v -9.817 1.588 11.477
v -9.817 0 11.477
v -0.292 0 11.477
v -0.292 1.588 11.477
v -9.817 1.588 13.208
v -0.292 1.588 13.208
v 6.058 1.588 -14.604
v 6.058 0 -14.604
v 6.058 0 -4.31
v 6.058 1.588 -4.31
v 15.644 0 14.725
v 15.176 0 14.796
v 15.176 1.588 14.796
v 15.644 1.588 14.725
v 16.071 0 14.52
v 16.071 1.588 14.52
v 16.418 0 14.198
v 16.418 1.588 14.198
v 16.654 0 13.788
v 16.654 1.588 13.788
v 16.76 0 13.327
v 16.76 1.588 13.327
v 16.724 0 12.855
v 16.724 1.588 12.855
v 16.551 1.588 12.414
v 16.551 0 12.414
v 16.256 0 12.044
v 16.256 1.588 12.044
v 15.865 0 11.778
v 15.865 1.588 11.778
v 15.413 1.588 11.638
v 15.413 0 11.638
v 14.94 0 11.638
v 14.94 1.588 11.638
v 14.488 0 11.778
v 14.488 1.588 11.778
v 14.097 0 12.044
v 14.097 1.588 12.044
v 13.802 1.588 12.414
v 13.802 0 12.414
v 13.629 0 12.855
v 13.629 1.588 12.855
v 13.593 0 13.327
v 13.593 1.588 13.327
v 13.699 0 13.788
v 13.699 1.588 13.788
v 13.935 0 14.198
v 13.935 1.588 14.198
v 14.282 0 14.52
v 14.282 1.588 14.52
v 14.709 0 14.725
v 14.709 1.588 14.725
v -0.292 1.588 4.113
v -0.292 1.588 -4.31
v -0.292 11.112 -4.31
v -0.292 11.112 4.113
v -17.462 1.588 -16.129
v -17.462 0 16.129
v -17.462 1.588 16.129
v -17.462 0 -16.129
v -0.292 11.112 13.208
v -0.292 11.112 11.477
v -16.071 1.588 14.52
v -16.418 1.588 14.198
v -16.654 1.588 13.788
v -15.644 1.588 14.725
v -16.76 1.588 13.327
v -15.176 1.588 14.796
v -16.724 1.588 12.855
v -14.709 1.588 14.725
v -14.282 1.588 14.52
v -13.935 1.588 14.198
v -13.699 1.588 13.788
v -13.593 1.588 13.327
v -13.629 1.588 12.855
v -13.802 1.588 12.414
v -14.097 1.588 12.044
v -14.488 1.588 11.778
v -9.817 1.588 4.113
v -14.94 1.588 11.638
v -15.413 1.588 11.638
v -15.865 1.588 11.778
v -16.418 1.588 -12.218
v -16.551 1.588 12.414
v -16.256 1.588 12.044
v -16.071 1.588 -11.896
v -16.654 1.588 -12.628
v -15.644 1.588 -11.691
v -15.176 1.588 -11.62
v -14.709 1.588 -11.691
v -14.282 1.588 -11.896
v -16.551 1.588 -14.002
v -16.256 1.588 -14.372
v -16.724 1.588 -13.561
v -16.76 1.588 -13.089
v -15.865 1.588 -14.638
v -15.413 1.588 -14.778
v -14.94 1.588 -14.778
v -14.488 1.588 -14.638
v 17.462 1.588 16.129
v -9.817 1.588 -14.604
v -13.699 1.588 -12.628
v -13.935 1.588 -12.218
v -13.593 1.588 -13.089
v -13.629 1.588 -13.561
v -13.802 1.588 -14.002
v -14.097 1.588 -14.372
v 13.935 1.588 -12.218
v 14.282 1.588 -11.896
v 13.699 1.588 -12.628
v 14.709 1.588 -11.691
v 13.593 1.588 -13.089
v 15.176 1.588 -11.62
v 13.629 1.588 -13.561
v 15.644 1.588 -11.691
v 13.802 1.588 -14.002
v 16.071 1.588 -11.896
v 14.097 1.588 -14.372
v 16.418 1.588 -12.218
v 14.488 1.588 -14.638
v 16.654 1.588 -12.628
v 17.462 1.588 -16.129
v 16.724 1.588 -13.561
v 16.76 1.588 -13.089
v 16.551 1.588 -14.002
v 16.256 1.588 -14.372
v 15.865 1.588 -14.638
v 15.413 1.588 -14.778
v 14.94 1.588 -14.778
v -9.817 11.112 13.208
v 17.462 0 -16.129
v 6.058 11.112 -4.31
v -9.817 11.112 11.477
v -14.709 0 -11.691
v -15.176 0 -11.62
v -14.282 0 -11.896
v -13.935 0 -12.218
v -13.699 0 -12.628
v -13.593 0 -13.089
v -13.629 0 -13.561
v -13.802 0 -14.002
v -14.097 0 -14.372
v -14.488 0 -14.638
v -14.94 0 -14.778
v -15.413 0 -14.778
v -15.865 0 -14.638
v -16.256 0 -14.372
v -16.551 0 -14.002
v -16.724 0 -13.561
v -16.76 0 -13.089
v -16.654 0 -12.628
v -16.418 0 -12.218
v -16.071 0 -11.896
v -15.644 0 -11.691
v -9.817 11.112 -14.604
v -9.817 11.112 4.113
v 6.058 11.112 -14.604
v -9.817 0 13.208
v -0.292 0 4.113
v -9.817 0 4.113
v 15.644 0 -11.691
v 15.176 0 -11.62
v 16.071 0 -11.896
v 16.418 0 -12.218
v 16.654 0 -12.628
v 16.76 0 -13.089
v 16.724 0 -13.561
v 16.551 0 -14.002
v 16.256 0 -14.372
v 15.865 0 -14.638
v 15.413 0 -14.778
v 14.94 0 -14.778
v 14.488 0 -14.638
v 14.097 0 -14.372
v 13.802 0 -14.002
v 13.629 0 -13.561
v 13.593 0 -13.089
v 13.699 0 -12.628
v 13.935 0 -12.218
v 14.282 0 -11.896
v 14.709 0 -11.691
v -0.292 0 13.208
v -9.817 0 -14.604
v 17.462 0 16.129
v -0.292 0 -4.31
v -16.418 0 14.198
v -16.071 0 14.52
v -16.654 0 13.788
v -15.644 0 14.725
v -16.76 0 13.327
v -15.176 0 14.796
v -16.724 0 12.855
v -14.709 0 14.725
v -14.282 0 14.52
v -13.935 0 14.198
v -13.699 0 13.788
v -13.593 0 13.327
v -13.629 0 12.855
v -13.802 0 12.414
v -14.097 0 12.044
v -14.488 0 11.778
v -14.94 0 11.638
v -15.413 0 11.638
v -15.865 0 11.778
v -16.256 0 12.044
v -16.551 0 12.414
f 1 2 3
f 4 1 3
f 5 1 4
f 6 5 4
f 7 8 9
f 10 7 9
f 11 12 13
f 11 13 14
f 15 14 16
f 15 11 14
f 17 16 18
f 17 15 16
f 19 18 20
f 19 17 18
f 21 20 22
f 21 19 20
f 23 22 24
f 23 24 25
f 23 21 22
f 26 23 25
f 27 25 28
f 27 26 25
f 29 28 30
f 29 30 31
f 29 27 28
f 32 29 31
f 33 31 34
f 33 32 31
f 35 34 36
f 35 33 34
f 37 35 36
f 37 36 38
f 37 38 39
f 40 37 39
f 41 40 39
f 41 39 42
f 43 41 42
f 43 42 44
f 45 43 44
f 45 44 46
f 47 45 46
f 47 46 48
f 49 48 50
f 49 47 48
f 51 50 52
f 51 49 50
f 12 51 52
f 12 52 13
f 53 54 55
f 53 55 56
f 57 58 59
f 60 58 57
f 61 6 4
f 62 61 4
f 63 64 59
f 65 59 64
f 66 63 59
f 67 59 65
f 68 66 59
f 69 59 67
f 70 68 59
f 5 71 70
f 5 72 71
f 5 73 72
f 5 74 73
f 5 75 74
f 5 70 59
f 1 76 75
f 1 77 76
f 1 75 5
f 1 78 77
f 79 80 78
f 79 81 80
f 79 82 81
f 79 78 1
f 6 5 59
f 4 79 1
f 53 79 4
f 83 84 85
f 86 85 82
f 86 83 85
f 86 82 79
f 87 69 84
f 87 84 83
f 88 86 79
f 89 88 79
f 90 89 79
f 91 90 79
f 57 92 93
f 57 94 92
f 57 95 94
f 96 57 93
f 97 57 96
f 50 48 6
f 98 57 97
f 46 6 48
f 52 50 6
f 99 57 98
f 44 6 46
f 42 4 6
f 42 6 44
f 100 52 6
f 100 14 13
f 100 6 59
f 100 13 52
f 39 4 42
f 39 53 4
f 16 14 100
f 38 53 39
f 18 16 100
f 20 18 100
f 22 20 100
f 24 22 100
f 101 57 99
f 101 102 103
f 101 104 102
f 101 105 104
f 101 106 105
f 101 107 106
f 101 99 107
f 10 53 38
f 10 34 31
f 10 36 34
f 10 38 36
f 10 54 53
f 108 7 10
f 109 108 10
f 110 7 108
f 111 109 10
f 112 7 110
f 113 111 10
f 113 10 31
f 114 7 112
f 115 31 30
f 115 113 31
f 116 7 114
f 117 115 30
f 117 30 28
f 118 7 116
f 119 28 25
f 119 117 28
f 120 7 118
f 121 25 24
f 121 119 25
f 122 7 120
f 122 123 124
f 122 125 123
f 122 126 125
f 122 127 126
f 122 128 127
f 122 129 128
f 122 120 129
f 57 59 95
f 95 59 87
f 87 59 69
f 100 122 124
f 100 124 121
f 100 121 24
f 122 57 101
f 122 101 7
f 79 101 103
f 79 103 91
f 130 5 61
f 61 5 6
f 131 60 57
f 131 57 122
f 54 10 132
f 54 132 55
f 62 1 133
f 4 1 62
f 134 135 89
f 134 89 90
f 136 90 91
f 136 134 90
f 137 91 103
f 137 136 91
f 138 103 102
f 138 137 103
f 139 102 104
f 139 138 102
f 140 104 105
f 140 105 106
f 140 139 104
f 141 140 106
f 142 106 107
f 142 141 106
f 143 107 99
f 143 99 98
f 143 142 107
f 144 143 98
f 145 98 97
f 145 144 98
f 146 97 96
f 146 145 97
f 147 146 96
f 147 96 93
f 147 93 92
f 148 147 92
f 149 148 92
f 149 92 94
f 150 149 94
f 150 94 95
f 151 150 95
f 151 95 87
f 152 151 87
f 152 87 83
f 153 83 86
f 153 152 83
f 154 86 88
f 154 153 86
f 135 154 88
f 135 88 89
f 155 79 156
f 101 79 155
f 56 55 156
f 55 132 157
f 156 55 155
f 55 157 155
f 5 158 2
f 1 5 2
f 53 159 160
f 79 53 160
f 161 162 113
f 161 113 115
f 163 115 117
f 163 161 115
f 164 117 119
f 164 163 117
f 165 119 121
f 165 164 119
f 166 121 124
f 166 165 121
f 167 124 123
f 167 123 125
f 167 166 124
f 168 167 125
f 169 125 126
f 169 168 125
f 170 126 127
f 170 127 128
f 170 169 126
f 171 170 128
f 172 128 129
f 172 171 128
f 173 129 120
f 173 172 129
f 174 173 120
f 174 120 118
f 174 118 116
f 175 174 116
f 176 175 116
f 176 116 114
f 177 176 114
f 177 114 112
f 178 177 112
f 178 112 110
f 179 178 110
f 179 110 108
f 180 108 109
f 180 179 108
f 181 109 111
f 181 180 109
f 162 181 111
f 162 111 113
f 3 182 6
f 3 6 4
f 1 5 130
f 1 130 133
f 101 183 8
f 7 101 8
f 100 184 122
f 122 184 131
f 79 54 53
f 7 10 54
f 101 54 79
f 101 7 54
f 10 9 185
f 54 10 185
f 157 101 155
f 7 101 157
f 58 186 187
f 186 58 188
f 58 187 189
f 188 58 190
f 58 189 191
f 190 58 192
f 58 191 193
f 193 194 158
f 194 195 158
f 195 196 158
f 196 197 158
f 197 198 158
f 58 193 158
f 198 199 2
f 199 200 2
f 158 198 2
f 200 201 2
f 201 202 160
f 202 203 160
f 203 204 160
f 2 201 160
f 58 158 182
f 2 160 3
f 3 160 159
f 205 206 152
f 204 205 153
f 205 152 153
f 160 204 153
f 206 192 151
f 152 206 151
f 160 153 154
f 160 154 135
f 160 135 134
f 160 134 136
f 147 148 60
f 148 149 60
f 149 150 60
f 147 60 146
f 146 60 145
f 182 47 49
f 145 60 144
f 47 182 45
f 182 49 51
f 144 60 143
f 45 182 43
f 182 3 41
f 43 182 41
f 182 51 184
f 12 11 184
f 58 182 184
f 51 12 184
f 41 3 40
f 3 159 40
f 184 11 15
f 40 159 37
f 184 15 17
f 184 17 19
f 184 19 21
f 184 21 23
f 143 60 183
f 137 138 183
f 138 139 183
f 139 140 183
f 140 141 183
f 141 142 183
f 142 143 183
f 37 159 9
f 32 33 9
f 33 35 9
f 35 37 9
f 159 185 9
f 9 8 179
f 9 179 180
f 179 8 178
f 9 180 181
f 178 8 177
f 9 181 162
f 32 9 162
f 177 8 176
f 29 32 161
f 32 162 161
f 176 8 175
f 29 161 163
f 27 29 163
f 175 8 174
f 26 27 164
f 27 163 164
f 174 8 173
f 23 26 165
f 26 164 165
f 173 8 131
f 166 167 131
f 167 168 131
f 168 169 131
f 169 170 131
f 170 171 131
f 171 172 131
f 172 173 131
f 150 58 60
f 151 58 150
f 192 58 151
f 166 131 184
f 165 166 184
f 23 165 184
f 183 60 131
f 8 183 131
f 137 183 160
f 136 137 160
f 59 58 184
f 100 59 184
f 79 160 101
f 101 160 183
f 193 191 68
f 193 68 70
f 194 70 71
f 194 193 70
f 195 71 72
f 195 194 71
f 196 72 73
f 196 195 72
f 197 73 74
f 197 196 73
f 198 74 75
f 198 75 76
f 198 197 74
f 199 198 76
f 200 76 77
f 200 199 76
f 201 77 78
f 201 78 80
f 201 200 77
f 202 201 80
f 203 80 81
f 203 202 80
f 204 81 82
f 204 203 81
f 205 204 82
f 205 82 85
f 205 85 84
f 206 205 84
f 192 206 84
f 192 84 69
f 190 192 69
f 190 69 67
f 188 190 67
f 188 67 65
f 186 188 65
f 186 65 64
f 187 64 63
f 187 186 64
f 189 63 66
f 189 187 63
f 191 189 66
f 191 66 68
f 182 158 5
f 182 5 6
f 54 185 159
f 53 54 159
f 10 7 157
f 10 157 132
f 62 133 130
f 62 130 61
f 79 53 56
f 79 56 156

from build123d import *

# Parameters (mm, degrees)
SKETCH2_W             = 34.925
SKETCH2_H             = 32.258
SKETCH2_R             = 1.5875
SKETCH2_W_2           = 9.525
SKETCH2_H_2           = 1.73056427
BOSS_EXTRUDE1_DEPTH   = 1.5875
BOSS_EXTRUDE2_DEPTH   = 9.525
SKETCH3_W             = 9.525
SKETCH3_H             = 1.73056427
BOSS_EXTRUDE2_2_DEPTH = 9.525


with BuildPart() as part:
    # Sketch2 → Boss-Extrude1 (new body)
    with BuildSketch(Plane(origin=(0, 0, 0), x_dir=(1, 0, 0), z_dir=(0, 1, 0))):
        Rectangle(SKETCH2_W, SKETCH2_H)
        with Locations(Location((-15.1765, -13.208, 0), (0, 0, 270))):
            Circle(SKETCH2_R, mode=Mode.SUBTRACT)
        with Locations((-5.054257583, -12.342717865)):
            Rectangle(SKETCH2_W_2, SKETCH2_H_2, mode=Mode.SUBTRACT)
        with Locations(Location((15.1765, -13.208, 0), (0, 0, 270))):
            Circle(SKETCH2_R, mode=Mode.SUBTRACT)
        Polygon((-9.816757583, -4.112709283), (-9.816757583, 14.603812005), (-0.291757583, 14.603812005), (6.058242417, 14.603812005), (6.058242417, 4.309725297), (-0.291757583, 4.309725297), (-0.291757583, -4.112709283), align=None, mode=Mode.SUBTRACT)
        with Locations(Location((-15.1765, 13.208, 0), (0, 0, 270))):
            Circle(SKETCH2_R, mode=Mode.SUBTRACT)
        with Locations(Location((15.1765, 13.208, 0), (0, 0, 270))):
            Circle(SKETCH2_R, mode=Mode.SUBTRACT)
    extrude(amount=BOSS_EXTRUDE1_DEPTH)


with BuildPart() as body_2:
    # Sketch3 → Boss-Extrude2 (new body)
    with BuildSketch(Plane(origin=(0, 1.5875, 0), x_dir=(1, 0, 0), z_dir=(0, 1, 0))):
        Polygon((-9.816757583, 14.603812005), (6.058242417, 14.603812005), (6.058242417, 4.309725297), (-0.291757583, 4.309725297), (-0.291757583, -4.112709283), (-9.816757583, -4.112709283), align=None)
    extrude(amount=BOSS_EXTRUDE2_DEPTH)


with BuildPart() as body_3:
    # Sketch3 → Boss-Extrude2 2 (new body)
    with BuildSketch(Plane(origin=(0, 1.5875, 0), x_dir=(1, 0, 0), z_dir=(0, 1, 0))):
        with Locations((-5.054257583, -12.342717865)):
            Rectangle(SKETCH3_W, SKETCH3_H)
    extrude(amount=BOSS_EXTRUDE2_2_DEPTH)


solid = Compound([part.part, body_2.part, body_3.part])
